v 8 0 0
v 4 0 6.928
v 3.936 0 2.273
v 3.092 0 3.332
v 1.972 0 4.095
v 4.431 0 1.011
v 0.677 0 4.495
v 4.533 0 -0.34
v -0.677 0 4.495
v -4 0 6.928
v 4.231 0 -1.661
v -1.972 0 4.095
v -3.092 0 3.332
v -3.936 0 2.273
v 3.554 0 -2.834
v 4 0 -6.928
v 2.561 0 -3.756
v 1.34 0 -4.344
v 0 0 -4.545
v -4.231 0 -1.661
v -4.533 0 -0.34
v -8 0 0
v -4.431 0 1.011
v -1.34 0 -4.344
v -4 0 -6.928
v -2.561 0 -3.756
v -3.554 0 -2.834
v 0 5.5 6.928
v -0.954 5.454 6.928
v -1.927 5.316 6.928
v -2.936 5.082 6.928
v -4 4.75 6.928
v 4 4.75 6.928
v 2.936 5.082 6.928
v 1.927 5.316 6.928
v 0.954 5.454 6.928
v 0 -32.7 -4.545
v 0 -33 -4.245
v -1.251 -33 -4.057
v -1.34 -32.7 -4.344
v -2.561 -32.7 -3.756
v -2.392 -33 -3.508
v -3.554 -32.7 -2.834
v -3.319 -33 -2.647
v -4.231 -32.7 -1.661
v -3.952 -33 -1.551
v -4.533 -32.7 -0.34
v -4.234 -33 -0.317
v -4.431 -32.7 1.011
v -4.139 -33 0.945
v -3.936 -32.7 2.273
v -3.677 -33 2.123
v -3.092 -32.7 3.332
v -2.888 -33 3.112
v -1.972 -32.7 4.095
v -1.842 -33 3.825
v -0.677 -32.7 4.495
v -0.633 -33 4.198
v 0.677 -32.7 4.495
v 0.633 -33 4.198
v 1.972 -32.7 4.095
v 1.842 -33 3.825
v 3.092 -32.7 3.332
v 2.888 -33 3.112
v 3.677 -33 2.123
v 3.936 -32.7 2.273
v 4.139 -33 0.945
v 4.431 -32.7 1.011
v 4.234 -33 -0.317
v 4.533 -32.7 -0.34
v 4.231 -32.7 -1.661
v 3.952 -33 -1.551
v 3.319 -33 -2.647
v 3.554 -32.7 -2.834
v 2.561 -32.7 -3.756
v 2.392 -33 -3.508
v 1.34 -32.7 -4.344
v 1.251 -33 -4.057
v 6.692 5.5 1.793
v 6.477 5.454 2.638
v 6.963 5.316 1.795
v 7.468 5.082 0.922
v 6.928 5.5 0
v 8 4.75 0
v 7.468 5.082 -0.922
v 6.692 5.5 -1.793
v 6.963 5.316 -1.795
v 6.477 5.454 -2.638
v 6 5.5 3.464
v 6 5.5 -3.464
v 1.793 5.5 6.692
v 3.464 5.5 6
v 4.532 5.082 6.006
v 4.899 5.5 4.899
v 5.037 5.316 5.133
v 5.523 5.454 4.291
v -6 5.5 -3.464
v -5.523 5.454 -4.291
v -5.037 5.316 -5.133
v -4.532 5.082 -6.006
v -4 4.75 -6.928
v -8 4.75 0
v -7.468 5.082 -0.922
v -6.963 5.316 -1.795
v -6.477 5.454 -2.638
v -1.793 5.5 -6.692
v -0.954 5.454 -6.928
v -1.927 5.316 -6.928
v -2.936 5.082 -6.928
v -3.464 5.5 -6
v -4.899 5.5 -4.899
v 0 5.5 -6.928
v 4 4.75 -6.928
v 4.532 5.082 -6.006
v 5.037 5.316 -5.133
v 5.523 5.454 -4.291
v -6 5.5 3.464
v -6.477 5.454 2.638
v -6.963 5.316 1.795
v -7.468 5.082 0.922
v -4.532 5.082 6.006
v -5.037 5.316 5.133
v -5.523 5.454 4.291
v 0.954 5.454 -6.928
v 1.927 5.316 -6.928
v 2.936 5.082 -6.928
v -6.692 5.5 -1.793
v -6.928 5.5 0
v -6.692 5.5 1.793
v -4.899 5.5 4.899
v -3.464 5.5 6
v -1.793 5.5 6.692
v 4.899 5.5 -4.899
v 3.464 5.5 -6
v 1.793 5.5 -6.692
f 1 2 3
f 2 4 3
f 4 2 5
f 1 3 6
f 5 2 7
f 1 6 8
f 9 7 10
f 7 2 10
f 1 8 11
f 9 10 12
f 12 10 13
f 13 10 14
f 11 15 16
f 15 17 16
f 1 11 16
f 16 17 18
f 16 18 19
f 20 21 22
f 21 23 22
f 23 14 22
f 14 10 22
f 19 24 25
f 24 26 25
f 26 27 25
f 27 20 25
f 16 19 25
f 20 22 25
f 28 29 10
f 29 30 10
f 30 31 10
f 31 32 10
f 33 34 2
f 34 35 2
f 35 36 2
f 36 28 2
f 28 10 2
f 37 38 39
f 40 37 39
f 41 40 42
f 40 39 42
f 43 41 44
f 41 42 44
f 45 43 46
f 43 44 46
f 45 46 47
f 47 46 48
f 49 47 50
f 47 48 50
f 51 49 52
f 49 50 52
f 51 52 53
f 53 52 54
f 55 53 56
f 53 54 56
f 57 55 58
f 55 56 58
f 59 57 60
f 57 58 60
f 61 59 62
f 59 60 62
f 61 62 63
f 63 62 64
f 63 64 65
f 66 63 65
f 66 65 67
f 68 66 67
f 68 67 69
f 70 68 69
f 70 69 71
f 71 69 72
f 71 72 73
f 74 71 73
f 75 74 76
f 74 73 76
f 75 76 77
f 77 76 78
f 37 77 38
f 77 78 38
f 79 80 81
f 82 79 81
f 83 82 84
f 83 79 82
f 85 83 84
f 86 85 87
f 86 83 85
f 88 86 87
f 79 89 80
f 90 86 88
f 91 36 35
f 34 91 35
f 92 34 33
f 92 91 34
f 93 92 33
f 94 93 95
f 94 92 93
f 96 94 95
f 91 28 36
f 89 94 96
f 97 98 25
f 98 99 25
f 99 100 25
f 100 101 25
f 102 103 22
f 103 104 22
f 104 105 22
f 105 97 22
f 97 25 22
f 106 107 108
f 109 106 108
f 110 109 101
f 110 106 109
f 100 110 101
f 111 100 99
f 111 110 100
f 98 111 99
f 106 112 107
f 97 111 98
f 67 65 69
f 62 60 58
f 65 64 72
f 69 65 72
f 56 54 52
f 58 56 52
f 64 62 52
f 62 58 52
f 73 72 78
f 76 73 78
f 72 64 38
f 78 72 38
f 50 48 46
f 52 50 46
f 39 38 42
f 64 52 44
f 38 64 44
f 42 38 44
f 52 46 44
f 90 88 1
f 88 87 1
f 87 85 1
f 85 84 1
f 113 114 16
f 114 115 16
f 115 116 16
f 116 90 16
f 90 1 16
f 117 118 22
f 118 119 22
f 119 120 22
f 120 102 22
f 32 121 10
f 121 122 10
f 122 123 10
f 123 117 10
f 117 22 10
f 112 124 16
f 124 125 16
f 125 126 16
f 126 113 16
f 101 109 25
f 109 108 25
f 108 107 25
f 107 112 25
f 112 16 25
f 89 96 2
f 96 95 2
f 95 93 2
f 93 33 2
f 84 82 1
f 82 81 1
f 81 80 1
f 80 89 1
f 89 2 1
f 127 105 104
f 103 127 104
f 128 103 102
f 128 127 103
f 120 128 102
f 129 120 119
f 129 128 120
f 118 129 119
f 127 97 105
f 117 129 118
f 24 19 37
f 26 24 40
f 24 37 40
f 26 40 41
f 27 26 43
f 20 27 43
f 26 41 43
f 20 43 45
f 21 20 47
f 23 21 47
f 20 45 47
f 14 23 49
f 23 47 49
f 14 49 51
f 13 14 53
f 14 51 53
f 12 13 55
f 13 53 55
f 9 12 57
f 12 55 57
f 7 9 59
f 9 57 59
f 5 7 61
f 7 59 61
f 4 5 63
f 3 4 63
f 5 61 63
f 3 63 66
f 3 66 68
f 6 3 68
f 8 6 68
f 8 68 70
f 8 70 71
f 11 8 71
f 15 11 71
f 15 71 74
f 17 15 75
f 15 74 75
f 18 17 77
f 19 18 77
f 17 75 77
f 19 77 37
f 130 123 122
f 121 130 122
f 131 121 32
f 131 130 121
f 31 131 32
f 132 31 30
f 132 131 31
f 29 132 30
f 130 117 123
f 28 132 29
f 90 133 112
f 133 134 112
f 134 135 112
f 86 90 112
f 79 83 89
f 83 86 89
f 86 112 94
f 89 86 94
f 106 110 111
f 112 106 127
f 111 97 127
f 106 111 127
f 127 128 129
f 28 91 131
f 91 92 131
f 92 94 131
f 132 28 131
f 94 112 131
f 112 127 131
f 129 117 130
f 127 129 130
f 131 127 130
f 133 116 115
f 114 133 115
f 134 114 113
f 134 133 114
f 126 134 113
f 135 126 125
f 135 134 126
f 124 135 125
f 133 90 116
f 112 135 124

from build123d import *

# Parameters (mm, degrees)
SKETCH_2_OUTSIDE_W  = 26.932
SKETCH_2_OUTSIDE_H  = 26.932
CUT_EXTRUDE_1_DEPTH = 5.5
CUT_EXTRUDE_START   = 5.5
SKETCH_3_OUTSIDE_W  = 34.642
SKETCH_3_OUTSIDE_H  = 32.498
SKETCH_3_OUTSIDE_R  = 6.92820323
CUT_EXTRUDE_2_DEPTH = 2.75
CUT_EXTRUDE_2_DRAFT = -55
CHAMFER_1_SIZE      = 0.3


with BuildPart() as part:
    # 草图1 → 旋转1 (revolve)
    with BuildSketch(Plane.XY, mode=Mode.PRIVATE) as revolve_1_sk:
        Polygon((0, 5.5), (8, 5.5), (8, 0), (4.545454545, 0), (4.545454545, -33), (0, -33), align=None)
    revolve(revolve_1_sk.sketch.rotate(Axis((0, 0, 0), (0, 1, 0)), 90), axis=Axis((0, 0, 0), (0, 1, 0)))

    # 草图2 outside → 切除-拉伸1 (cut)
    with BuildSketch(Plane(origin=(0, 0, 0), x_dir=(1, 0, 0), z_dir=(0, 1, 0))):
        Rectangle(SKETCH_2_OUTSIDE_W, SKETCH_2_OUTSIDE_H)
        Polygon((8, 0), (4, 6.92820323), (-4, 6.92820323), (-8, 0), (-4, -6.92820323), (4, -6.92820323), align=None, mode=Mode.SUBTRACT)
    extrude(amount=CUT_EXTRUDE_1_DEPTH, mode=Mode.SUBTRACT)


with BuildPart() as cut_extrude_2_tool:
    # 草图3 outside → 切除-拉伸2 (with draft: the straight prism first)
    with BuildSketch(Plane(origin=(0, 0, 0), x_dir=(1, 0, 0), z_dir=(0, 1, 0)).offset(CUT_EXTRUDE_START)):
        Rectangle(SKETCH_3_OUTSIDE_W, SKETCH_3_OUTSIDE_H)
        Circle(SKETCH_3_OUTSIDE_R, mode=Mode.SUBTRACT)
    extrude(amount=-CUT_EXTRUDE_2_DEPTH)
    # 切除-拉伸2: the draft: its side faces are tilted about the plane it starts from
    cut_extrude_2_sides = [cut_extrude_2_tool.faces().sort_by_distance(p)[0] for p in [
        (0, 4.125, 16.249),
        (17.321, 4.125, 0),
        (0, 4.125, -16.249),
        (-17.321, 4.125, 0),
        (-6.92820323, 4.125, 0),
    ]]
    draft(cut_extrude_2_sides, Plane(origin=(0, 0, 0), x_dir=(1, 0, 0), z_dir=(0, 1, 0)).offset(CUT_EXTRUDE_START), CUT_EXTRUDE_2_DRAFT)


with BuildPart() as part_1:
    add(part.part)

    # 切除-拉伸2: cut by cut_extrude_2_tool
    add(cut_extrude_2_tool.part, mode=Mode.SUBTRACT)

    # 倒角1
    chamfer_1_edges = [part_1.edges().sort_by_distance(p)[0] for p in [
        (0, -33, 4.545454545),
    ]]
    chamfer(chamfer_1_edges, length=CHAMFER_1_SIZE)


solid = part_1.part
